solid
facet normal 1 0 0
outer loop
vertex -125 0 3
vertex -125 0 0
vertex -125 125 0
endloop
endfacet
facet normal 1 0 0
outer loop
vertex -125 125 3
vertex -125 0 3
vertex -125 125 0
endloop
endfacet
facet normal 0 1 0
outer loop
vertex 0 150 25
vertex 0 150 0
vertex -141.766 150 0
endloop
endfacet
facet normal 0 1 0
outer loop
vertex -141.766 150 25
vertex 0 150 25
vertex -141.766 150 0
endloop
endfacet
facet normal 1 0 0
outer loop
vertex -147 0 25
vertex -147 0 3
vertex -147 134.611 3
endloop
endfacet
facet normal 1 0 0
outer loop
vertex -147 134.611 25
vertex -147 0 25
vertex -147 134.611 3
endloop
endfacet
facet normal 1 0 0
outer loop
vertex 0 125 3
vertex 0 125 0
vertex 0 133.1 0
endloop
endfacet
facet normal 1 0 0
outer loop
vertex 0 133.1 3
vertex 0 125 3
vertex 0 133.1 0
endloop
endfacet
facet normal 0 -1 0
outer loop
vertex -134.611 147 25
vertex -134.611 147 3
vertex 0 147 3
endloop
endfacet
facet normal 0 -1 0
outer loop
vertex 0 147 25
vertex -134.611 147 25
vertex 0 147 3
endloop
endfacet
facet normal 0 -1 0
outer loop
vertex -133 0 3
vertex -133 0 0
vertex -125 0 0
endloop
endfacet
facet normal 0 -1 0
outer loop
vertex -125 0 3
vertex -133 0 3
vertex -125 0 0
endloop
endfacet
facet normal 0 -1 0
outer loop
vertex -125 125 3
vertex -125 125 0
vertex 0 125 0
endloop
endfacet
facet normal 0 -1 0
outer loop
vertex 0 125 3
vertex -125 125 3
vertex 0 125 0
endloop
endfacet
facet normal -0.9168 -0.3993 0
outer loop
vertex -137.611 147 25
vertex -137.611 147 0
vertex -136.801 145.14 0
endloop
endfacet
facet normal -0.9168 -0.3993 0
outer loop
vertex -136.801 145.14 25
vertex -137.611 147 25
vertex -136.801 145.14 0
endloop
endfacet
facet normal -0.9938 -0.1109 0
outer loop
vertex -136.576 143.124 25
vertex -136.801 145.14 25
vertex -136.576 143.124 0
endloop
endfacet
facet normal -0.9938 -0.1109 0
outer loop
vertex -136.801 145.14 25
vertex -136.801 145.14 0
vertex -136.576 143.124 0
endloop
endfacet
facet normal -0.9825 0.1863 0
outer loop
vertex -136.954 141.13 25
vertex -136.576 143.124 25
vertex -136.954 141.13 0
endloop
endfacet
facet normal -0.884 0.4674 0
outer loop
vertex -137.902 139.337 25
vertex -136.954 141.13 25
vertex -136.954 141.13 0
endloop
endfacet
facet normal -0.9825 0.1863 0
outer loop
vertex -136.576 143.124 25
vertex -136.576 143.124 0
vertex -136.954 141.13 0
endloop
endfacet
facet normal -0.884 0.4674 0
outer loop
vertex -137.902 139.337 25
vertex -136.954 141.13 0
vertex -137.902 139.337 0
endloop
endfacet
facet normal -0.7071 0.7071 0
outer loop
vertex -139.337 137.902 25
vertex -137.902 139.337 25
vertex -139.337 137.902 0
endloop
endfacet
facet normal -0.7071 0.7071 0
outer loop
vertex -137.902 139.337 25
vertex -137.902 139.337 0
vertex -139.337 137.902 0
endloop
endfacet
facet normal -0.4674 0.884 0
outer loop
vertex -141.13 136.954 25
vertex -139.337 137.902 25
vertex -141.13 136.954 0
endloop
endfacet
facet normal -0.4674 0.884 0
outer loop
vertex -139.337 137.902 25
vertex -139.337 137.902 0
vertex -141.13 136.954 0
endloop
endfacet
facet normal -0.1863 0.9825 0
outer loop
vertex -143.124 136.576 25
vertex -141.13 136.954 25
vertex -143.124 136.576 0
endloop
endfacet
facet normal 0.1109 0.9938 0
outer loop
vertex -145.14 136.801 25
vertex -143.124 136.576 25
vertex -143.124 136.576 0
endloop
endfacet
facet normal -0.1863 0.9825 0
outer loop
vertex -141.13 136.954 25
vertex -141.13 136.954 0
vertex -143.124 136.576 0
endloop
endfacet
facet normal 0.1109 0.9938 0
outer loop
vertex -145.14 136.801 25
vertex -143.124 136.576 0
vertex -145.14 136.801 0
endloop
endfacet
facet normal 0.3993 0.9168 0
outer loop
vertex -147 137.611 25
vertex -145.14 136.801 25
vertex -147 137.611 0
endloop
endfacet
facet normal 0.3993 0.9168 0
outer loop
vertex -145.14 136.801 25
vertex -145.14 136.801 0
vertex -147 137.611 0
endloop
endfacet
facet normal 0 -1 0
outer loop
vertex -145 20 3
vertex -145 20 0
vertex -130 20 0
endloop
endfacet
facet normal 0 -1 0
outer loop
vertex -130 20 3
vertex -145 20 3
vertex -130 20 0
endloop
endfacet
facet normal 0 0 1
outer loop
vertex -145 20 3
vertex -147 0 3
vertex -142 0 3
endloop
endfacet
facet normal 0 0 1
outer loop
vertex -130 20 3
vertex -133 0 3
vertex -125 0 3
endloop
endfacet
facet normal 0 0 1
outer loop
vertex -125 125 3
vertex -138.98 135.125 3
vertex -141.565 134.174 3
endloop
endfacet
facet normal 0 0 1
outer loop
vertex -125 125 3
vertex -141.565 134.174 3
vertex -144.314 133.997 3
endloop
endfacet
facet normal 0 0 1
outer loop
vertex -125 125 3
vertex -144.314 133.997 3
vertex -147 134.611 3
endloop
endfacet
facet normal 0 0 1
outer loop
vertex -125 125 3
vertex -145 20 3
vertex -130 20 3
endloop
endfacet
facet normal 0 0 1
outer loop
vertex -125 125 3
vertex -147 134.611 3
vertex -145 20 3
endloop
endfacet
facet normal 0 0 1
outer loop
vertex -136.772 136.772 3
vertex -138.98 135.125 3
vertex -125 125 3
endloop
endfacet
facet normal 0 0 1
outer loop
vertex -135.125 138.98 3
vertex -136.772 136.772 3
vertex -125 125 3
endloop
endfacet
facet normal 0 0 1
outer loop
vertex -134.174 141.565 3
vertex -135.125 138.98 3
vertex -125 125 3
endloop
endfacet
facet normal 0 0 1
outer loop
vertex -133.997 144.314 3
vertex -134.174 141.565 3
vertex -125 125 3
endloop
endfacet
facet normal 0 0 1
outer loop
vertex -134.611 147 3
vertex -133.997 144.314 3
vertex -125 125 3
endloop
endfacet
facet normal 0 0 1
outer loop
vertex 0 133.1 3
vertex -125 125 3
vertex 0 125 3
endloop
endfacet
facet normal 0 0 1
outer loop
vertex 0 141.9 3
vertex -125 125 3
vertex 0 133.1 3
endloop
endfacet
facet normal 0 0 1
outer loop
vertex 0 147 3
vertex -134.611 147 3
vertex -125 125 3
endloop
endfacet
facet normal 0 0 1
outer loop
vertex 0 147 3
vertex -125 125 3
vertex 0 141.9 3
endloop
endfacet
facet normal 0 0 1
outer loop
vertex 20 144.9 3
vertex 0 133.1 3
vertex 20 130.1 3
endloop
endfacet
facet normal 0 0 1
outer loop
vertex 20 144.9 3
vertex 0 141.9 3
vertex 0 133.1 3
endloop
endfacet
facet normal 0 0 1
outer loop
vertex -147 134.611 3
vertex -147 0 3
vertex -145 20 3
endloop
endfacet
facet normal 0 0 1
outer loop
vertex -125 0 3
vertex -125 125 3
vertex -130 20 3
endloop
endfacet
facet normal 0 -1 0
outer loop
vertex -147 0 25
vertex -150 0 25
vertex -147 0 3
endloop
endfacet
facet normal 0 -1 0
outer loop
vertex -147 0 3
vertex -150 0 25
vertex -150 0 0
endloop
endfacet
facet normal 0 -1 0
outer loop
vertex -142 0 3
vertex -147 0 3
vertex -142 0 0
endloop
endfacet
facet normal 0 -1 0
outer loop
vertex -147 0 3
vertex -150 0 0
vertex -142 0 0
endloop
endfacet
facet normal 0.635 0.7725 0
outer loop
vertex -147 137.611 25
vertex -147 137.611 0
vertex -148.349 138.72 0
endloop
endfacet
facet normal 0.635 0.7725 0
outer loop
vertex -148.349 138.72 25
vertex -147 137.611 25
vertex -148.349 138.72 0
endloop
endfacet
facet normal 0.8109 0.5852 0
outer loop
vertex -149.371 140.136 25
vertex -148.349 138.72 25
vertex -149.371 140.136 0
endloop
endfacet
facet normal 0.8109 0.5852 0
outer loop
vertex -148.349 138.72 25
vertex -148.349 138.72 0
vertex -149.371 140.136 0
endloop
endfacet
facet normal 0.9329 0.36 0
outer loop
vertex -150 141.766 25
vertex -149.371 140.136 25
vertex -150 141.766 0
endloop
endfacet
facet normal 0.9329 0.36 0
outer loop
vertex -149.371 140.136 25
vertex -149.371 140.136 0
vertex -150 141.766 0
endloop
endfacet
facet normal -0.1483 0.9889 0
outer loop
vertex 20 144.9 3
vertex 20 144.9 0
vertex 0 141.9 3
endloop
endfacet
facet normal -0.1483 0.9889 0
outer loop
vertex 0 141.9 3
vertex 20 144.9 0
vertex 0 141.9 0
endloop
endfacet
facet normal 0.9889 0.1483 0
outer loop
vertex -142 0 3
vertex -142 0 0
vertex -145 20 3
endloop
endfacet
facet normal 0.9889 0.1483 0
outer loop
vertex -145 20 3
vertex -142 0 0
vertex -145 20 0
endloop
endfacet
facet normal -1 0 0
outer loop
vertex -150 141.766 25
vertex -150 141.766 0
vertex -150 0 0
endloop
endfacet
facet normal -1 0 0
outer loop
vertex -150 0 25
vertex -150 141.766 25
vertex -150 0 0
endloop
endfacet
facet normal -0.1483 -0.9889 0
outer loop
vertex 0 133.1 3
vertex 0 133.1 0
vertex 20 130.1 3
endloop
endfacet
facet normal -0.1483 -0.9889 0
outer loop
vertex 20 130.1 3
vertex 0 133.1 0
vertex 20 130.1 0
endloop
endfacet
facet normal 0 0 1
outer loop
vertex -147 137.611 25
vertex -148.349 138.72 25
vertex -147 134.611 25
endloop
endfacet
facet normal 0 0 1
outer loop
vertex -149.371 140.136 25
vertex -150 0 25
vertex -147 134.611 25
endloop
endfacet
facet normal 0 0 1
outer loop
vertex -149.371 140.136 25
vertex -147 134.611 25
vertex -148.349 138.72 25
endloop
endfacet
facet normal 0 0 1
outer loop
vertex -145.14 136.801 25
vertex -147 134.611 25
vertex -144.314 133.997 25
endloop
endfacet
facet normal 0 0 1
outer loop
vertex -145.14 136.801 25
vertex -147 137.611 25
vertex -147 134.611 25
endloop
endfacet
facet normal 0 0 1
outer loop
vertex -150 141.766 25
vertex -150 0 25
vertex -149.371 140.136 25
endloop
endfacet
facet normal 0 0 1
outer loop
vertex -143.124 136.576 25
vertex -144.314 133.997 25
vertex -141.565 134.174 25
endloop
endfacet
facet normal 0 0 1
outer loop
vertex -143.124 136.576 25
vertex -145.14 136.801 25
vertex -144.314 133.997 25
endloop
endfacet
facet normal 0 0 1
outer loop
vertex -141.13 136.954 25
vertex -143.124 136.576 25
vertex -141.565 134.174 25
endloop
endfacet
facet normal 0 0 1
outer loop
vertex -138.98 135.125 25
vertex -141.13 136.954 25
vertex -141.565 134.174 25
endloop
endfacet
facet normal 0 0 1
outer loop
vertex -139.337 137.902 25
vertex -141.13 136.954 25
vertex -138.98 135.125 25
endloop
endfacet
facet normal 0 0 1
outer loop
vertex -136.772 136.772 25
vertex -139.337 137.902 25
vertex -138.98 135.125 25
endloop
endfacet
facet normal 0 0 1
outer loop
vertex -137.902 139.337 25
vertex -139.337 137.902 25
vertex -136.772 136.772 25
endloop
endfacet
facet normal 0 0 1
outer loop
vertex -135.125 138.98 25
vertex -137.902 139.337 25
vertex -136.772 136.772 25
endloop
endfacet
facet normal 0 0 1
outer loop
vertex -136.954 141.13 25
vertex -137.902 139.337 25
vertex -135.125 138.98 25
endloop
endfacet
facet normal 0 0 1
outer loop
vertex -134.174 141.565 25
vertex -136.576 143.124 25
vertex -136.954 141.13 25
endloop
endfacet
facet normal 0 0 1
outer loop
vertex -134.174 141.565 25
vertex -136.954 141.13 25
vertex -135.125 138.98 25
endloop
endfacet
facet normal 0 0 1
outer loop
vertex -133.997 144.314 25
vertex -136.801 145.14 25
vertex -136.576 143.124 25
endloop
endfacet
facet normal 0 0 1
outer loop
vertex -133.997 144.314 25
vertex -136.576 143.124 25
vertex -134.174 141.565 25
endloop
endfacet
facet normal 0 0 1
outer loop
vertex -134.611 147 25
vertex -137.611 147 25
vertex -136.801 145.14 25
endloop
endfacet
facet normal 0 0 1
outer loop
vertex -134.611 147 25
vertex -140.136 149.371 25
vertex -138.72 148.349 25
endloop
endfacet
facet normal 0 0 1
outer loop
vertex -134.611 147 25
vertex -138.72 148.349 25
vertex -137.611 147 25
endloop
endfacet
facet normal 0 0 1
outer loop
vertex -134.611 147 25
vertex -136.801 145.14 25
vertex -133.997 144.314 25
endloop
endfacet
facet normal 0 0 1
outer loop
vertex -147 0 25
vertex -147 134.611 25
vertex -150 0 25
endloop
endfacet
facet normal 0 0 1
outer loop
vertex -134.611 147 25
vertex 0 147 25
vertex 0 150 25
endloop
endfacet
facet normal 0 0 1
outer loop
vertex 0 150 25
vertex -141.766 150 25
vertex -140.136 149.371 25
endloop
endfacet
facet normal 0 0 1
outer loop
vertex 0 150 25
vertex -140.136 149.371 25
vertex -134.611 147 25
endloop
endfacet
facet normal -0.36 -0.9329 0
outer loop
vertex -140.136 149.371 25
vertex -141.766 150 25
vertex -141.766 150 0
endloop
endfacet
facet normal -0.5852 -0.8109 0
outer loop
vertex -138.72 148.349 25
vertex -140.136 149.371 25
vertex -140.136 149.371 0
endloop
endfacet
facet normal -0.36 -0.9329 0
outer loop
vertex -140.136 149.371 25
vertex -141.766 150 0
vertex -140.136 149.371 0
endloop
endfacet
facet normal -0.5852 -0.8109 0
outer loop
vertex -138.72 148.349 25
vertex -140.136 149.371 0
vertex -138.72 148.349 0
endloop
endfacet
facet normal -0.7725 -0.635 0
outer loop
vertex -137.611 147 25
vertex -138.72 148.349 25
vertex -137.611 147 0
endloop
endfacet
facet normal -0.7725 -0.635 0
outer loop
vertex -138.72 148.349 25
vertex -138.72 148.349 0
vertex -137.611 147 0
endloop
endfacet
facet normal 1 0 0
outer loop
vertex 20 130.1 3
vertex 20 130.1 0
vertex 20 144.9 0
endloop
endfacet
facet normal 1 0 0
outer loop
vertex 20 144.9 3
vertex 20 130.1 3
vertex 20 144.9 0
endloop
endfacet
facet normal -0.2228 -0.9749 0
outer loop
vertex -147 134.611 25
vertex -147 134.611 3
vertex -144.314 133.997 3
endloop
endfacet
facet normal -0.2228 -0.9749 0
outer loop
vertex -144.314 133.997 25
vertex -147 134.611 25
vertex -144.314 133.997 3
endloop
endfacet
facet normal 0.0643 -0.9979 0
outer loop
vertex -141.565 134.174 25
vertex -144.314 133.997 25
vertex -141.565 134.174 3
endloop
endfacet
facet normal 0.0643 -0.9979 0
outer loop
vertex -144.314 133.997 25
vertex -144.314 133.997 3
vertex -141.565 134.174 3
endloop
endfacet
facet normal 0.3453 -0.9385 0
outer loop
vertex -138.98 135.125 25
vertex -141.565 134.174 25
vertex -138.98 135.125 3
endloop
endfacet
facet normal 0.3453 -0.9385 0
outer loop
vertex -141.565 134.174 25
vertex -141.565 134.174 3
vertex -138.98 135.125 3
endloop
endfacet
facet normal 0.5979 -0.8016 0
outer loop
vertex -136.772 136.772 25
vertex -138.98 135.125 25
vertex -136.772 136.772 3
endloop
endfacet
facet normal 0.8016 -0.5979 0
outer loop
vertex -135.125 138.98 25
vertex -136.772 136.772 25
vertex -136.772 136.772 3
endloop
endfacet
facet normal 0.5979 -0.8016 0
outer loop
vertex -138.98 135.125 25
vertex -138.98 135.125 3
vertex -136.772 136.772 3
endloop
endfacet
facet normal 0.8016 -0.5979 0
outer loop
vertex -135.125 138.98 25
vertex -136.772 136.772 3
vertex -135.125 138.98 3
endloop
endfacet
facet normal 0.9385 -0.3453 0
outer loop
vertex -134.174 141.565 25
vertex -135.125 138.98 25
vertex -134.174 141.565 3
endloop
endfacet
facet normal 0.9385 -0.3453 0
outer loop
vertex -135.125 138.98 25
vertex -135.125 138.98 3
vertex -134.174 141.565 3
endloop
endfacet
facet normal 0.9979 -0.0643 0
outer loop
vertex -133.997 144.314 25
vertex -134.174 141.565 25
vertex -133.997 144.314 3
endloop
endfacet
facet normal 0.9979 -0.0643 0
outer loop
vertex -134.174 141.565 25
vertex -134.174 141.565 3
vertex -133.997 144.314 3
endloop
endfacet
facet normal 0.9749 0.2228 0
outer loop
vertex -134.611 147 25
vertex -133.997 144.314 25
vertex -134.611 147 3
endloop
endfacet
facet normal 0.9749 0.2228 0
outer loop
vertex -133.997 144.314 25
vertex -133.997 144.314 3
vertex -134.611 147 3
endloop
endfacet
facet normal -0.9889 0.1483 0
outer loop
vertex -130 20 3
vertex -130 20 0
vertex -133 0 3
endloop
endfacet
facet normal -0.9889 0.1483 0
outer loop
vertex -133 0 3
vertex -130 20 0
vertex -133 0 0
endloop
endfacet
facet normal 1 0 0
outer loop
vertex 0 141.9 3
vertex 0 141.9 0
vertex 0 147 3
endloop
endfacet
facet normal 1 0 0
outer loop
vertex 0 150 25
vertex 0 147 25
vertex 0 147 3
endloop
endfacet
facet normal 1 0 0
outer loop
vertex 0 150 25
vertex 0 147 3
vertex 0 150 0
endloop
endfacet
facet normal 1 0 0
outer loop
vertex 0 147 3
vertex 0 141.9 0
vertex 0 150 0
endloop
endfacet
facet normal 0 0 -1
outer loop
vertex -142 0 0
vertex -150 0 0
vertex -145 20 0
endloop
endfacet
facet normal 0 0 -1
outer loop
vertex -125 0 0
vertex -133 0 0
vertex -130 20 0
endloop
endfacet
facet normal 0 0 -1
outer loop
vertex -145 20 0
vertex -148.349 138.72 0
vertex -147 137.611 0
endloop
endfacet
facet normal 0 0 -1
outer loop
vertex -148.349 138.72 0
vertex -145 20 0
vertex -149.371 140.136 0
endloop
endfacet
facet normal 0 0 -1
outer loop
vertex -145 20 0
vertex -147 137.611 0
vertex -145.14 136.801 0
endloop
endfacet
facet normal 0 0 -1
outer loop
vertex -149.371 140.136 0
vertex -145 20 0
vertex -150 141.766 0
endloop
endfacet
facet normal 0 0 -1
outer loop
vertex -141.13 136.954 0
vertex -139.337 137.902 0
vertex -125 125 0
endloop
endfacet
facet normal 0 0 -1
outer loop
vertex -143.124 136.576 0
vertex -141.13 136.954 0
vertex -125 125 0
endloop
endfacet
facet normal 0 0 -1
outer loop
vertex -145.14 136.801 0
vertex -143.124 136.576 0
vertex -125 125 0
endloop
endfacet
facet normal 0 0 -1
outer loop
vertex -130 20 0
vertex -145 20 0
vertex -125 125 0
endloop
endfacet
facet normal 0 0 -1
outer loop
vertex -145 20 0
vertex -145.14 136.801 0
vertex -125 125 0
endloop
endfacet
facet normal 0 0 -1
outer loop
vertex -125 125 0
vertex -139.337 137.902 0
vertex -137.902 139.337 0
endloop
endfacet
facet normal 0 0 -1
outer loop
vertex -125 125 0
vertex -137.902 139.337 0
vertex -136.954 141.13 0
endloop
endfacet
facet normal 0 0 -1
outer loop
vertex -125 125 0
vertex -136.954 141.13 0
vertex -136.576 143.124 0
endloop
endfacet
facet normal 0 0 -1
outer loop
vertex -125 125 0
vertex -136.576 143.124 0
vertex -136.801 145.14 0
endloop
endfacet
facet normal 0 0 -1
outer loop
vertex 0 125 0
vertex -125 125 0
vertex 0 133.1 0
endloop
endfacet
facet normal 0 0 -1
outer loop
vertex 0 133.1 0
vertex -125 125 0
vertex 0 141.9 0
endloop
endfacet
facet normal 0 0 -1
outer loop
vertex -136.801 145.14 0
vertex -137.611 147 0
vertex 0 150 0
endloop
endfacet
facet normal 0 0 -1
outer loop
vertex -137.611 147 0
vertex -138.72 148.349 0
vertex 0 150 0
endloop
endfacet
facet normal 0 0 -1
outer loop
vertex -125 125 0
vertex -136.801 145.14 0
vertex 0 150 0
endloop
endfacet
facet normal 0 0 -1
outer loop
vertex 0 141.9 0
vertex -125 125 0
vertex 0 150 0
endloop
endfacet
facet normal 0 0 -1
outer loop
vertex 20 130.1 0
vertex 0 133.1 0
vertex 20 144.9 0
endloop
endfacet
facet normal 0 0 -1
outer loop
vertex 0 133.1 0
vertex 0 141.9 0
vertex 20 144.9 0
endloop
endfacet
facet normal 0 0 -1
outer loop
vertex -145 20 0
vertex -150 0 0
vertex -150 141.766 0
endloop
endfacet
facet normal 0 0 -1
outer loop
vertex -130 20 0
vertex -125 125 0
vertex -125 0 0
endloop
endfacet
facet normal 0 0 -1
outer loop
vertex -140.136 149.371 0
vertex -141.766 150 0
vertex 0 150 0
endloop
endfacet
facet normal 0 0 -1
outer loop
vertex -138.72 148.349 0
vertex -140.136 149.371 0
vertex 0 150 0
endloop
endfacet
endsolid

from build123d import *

# Parameters (mm, degrees)
F1_DEPTH = 3
F2_DEPTH = 25
F3_DEPTH = 25


with BuildPart() as f1:
    # F0 (on Top) → F1 (new body)
    with BuildSketch(Plane.XY):
        with BuildLine():
            Line((0, 141.9), (0, 147))
            Line((0, 147), (-134.61055, 147))
            ThreePointArc((-134.61055, 147), (-136.772472, 136.772472), (-147, 134.61055))
            Line((-147, 134.61055), (-147, 0))
            Line((-147, 0), (-142, 0))
            Line((-142, 0), (-145, 20))
            Line((-145, 20), (-130, 20))
            Line((-130, 20), (-133, 0))
            Line((-133, 0), (-125, 0))
            Line((-125, 0), (-125, 125))
            Line((-125, 125), (0, 125))
            Line((0, 125), (0, 133.1))
            Line((0, 133.1), (20, 130.1))
            Line((20, 130.1), (20, 144.9))
            Line((20, 144.9), (0, 141.9))
        make_face()
    extrude(amount=F1_DEPTH)

    # F0 (on Top) → F2 (join)
    with BuildSketch(Plane.XY):
        with BuildLine():
            ThreePointArc((-147, 137.61055), (-148.90564, 139.395179), (-150, 141.765568))
            Line((-150, 141.765568), (-150, 0))
            Line((-150, 0), (-147, 0))
            Line((-147, 0), (-147, 134.61055))
            Line((-147, 134.61055), (-147, 137.61055))
        make_face()
        with BuildLine():
            Line((0, 150), (-141.765568, 150))
            ThreePointArc((-141.765568, 150), (-139.395179, 148.90564), (-137.61055, 147))
            Line((-137.61055, 147), (-134.61055, 147))
            Line((-134.61055, 147), (0, 147))
            Line((0, 147), (0, 150))
        make_face()
    extrude(amount=F2_DEPTH)

    # F0 (on Top) → F3 (join)
    with BuildSketch(Plane.XY):
        with BuildLine():
            Line((-134.61055, 147), (-137.61055, 147))
            ThreePointArc((-137.61055, 147), (-138.565994, 138.565994), (-147, 137.61055))
            Line((-147, 137.61055), (-147, 134.61055))
            ThreePointArc((-147, 134.61055), (-136.772472, 136.772472), (-134.61055, 147))
        make_face()
    extrude(amount=F3_DEPTH)


solid = f1.part
